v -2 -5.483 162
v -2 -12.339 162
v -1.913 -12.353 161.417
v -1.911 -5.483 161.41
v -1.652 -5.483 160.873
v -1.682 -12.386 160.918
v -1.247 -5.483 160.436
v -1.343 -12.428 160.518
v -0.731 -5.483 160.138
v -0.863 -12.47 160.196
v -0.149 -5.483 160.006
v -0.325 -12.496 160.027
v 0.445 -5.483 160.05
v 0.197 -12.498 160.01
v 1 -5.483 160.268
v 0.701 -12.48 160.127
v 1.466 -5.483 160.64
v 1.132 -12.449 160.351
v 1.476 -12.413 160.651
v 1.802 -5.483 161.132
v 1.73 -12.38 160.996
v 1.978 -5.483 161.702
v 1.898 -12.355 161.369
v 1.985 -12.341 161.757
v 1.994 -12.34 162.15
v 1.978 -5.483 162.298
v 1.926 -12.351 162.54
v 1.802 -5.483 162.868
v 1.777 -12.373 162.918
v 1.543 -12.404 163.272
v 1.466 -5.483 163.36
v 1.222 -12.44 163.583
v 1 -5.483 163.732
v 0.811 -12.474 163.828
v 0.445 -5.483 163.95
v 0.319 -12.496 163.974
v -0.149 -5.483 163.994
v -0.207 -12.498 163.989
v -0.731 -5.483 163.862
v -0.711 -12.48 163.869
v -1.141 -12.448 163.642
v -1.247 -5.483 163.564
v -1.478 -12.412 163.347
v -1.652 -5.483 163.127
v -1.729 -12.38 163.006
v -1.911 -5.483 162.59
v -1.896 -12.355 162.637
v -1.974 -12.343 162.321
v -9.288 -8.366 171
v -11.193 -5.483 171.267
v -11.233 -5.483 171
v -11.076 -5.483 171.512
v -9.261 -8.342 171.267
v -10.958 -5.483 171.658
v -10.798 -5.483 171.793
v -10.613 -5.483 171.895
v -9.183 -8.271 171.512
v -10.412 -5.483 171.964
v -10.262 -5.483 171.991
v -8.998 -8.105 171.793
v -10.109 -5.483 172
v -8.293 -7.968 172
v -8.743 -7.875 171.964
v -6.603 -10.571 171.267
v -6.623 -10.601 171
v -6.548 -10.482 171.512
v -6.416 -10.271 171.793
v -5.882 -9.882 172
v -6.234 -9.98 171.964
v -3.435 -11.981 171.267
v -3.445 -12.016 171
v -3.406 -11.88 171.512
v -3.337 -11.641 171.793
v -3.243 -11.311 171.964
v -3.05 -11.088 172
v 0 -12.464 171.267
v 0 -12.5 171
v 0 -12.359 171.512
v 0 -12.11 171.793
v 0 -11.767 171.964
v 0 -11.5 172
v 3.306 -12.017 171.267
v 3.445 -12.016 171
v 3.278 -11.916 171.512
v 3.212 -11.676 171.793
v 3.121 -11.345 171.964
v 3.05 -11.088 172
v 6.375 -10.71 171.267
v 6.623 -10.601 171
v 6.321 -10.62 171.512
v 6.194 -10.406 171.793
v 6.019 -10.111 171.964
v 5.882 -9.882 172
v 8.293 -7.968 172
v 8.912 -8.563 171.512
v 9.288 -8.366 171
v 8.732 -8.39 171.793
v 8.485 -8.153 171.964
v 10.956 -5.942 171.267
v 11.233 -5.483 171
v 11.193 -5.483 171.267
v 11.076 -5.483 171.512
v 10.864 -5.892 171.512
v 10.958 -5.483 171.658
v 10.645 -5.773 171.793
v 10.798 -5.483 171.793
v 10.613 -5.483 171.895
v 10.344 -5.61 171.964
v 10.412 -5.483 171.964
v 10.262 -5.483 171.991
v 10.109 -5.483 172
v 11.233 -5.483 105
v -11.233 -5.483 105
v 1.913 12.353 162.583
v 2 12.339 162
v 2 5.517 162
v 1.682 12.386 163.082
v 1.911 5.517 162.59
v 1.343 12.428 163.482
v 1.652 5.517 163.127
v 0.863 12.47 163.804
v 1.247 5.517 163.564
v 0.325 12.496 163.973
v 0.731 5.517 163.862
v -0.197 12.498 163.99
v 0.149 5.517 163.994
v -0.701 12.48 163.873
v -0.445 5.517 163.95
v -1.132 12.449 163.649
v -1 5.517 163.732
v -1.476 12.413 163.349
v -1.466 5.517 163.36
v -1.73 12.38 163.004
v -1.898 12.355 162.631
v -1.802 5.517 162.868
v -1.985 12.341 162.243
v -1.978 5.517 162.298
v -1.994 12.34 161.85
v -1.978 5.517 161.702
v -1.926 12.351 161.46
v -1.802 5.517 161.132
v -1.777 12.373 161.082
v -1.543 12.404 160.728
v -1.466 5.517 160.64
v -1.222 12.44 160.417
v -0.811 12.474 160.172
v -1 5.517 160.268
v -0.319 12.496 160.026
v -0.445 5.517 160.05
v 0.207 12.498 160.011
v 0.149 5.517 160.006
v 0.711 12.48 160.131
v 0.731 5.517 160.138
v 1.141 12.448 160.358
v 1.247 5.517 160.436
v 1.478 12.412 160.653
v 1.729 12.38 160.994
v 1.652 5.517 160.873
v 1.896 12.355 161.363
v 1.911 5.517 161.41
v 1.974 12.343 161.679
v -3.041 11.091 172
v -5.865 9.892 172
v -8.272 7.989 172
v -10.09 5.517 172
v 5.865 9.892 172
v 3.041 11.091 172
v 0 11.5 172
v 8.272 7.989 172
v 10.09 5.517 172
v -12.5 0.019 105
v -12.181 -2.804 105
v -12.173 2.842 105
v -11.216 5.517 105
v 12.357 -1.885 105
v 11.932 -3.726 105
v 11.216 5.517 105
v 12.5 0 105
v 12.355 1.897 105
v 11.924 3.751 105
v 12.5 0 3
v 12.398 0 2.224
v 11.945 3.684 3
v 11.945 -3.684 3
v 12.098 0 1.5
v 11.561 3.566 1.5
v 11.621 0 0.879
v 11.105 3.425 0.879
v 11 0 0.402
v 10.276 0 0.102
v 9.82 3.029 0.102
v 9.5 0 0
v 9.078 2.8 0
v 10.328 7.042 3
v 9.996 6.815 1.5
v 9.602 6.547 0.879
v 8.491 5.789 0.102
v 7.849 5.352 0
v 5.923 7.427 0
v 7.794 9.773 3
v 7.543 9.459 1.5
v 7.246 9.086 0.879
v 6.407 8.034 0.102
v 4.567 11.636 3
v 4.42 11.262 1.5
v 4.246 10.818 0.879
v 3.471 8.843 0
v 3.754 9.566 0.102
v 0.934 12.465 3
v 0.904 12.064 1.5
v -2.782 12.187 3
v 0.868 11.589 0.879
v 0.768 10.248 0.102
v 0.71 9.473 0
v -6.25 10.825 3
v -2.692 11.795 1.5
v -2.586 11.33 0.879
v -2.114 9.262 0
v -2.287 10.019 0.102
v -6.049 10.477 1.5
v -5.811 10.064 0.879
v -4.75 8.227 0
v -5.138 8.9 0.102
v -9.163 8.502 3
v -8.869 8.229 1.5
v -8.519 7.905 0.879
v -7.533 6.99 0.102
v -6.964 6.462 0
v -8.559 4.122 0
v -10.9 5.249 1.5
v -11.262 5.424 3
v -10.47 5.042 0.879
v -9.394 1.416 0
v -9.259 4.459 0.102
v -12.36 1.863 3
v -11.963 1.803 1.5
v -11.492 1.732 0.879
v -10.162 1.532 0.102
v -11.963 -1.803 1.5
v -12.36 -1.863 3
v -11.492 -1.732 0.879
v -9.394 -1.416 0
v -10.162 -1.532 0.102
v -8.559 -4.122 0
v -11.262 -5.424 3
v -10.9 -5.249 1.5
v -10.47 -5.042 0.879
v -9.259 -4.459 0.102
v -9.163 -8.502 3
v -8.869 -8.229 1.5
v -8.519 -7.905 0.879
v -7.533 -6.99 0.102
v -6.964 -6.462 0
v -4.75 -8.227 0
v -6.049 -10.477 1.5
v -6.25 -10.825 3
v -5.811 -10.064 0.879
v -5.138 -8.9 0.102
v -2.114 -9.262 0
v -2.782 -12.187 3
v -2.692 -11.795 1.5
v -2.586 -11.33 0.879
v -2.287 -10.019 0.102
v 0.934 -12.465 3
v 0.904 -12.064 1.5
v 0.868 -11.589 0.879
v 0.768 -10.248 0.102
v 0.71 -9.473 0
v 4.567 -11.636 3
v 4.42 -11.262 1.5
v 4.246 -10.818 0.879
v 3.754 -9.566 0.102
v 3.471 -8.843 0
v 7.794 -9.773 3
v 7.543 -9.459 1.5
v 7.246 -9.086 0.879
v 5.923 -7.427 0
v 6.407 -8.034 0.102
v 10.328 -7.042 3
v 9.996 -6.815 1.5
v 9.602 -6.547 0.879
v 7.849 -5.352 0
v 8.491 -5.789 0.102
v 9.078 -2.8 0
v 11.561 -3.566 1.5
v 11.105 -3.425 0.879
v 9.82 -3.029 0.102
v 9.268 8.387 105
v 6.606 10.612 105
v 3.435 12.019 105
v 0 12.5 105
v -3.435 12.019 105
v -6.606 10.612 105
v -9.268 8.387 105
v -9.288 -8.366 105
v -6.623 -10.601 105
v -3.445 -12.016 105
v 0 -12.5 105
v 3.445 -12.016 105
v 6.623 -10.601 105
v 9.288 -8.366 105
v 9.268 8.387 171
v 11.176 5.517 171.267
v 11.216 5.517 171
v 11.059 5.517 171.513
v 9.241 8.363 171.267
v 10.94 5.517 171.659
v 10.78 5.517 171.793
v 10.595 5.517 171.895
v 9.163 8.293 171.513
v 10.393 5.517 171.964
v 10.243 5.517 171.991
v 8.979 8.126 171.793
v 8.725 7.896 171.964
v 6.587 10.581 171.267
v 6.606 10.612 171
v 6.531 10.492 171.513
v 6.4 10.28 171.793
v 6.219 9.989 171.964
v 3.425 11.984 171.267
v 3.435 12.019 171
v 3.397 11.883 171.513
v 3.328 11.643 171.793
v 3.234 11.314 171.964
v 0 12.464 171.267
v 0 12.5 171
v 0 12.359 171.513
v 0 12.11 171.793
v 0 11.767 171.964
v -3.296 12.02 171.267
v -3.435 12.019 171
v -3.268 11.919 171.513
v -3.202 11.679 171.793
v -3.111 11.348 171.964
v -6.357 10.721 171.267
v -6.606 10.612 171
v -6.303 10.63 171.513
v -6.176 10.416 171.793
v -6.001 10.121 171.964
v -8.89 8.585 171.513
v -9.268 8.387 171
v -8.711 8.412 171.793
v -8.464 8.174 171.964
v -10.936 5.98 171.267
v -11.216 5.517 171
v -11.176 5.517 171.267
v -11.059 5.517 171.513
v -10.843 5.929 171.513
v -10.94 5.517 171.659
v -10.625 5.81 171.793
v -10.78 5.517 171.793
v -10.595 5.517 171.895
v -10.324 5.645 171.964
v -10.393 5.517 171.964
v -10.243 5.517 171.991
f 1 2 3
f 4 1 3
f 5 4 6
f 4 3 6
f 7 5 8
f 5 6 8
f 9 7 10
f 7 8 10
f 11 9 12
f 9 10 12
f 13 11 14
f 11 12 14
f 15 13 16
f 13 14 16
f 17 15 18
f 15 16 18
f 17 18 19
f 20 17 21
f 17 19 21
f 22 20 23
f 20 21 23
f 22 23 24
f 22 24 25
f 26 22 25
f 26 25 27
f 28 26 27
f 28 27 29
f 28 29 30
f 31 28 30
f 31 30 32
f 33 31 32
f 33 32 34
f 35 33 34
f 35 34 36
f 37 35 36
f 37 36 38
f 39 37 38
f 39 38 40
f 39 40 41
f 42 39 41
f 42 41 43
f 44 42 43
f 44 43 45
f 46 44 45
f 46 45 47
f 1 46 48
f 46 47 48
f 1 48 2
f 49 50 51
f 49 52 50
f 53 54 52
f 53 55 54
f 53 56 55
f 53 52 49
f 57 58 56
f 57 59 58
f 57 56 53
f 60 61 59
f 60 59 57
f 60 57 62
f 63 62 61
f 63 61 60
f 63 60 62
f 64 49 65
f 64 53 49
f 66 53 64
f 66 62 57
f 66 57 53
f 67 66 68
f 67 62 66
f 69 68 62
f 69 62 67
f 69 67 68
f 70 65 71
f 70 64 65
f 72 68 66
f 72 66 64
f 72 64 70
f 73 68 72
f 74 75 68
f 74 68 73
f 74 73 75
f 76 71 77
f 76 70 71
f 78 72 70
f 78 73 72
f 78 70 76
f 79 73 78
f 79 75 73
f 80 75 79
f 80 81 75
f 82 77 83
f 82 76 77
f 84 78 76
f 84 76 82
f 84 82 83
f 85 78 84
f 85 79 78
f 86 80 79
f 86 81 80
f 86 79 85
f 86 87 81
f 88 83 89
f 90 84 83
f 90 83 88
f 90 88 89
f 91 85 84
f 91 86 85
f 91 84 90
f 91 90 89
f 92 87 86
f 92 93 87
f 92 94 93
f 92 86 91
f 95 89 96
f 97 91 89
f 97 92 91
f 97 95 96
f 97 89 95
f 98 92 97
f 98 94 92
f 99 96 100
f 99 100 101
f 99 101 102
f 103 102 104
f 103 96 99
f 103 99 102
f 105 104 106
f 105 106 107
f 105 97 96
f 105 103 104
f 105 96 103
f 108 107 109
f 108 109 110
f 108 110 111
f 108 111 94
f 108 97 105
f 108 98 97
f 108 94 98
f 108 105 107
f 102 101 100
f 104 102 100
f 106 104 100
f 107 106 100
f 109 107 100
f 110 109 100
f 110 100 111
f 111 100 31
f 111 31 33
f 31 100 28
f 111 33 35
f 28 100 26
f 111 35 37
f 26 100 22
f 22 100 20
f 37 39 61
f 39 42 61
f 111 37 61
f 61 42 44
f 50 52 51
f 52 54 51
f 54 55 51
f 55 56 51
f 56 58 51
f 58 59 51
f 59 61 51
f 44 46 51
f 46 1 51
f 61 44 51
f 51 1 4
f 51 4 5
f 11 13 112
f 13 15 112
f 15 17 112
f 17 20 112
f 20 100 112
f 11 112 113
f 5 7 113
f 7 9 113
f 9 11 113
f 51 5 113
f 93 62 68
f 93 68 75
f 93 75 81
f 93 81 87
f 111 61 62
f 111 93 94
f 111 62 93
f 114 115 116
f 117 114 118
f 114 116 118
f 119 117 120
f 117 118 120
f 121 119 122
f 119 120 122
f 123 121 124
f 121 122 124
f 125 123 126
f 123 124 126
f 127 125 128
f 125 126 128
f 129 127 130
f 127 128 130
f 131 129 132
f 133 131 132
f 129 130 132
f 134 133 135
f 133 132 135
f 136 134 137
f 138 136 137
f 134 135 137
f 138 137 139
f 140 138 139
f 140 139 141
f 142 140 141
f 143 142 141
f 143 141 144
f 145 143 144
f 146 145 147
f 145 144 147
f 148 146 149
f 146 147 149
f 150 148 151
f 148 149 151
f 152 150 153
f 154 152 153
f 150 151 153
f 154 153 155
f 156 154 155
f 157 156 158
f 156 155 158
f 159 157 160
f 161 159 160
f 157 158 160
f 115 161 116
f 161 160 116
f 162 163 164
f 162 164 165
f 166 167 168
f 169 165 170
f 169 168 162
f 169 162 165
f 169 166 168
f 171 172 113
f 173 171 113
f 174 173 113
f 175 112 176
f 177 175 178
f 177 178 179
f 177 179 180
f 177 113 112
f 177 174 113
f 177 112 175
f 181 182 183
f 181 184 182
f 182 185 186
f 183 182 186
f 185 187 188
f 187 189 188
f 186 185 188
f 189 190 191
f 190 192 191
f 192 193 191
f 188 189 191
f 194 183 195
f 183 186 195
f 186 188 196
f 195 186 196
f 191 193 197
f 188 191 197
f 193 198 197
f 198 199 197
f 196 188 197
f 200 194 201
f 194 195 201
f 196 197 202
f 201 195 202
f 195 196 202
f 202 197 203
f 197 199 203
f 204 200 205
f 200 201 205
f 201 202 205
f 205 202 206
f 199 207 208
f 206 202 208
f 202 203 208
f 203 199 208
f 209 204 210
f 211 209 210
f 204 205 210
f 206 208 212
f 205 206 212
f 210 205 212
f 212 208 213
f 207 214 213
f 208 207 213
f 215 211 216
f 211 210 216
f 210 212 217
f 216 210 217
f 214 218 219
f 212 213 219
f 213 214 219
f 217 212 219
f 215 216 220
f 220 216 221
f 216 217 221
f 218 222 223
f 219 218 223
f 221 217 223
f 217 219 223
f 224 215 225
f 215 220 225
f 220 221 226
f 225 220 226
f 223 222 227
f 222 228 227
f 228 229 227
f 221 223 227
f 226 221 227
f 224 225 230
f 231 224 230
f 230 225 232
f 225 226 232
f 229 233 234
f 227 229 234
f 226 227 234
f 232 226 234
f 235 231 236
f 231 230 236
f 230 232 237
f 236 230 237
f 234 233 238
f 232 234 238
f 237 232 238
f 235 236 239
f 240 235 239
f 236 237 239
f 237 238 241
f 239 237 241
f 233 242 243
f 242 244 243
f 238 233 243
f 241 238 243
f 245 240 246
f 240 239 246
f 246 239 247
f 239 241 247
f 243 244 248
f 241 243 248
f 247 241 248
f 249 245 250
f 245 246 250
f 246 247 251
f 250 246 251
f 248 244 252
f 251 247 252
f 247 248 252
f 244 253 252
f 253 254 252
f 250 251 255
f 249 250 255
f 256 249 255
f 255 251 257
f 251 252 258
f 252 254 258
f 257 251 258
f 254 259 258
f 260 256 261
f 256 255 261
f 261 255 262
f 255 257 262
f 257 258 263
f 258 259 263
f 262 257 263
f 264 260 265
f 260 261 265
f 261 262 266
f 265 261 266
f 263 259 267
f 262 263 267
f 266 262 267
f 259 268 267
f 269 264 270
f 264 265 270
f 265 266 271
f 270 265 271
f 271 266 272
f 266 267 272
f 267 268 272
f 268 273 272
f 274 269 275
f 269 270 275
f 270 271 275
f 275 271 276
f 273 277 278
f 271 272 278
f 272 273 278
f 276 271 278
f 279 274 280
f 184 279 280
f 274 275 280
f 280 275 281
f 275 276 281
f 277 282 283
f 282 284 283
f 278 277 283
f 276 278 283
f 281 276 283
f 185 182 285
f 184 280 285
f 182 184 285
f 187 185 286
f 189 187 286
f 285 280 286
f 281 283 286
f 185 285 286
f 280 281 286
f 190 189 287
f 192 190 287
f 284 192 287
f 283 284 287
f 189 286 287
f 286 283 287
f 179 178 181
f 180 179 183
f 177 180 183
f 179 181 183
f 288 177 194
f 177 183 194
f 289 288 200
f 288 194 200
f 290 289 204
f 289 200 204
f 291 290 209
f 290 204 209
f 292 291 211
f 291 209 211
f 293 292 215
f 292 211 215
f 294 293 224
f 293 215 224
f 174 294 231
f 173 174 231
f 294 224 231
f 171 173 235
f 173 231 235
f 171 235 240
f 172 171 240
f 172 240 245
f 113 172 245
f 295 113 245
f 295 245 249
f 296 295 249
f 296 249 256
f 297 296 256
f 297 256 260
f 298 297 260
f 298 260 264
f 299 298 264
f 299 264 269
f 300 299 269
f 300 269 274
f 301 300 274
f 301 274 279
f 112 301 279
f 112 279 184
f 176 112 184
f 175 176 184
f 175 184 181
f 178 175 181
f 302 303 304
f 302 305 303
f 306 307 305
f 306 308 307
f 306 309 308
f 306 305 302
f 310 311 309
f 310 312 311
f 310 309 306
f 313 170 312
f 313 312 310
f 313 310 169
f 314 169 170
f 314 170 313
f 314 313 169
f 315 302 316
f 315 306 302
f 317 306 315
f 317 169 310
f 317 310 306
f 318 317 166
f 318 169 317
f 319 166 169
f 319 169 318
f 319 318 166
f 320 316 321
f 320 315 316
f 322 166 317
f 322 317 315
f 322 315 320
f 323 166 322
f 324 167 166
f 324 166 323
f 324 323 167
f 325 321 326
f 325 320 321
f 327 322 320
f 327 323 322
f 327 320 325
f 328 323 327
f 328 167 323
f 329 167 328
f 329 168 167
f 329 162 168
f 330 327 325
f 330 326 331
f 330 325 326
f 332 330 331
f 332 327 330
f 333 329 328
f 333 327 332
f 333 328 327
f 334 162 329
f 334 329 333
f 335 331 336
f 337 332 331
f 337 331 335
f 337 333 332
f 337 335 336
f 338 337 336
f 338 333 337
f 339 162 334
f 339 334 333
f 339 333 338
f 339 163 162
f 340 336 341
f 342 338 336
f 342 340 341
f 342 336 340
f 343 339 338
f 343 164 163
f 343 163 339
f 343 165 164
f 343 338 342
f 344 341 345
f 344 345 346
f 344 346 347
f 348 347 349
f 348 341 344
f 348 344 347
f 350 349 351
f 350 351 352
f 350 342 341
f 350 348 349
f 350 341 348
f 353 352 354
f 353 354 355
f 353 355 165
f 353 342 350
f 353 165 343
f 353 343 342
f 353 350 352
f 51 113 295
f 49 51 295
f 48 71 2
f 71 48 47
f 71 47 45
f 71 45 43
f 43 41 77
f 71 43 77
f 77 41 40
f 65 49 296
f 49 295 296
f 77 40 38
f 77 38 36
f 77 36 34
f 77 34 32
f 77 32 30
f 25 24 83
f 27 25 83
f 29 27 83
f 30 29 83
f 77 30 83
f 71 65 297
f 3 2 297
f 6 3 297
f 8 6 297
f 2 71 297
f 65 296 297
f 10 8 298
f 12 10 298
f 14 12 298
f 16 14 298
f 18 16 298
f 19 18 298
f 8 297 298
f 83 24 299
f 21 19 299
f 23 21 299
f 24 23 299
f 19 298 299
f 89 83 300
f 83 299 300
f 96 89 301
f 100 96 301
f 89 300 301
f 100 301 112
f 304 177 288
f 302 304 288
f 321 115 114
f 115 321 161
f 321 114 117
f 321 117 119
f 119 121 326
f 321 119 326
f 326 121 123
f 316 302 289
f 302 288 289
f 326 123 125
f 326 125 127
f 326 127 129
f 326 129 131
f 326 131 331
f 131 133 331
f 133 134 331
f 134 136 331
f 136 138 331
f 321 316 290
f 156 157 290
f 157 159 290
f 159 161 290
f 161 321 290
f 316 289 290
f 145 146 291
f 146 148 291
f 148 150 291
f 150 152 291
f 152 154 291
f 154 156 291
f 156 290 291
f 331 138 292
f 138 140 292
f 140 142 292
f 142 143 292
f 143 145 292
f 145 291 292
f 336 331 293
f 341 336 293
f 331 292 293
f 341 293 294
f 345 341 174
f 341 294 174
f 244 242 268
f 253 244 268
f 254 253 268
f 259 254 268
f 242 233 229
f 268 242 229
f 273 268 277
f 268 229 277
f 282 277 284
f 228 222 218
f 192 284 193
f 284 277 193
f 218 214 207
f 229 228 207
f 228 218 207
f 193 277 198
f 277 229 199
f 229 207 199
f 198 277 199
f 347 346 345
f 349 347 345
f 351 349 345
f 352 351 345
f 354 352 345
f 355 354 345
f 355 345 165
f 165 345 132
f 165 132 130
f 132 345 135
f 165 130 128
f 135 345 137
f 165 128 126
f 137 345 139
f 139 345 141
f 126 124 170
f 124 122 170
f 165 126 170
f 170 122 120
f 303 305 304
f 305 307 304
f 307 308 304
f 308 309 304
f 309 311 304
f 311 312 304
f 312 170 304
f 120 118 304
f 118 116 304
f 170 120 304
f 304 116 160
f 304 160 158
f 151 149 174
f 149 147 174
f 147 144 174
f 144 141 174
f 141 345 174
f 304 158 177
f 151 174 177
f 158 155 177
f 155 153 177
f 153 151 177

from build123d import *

# Parameters (mm, degrees)
F0_R     = 12.5
F1_DEPTH = 105
F3_DEPTH = 67
F4_R     = 3
F6_D     = 4
F6_DEPTH = 20
F6_TIP   = 1.2017212381
F7_D     = 4
F7_DEPTH = 20
F7_START = 11
F7_TIP   = 1.2017212381
F8_R     = 1


with BuildPart() as f1:
    # F0 (on Top) → F1 (new body)
    with BuildSketch(Plane.XY):
        Circle(F0_R)
    extrude(amount=F1_DEPTH)

    # F2 (on face) → F3 (join)
    with BuildSketch(Plane.XY.offset(105)):
        with BuildLine():
            Line((11.2334422785, -5.4826795069), (-11.2334422785, -5.4826795069))
            ThreePointArc((-11.2334422785, -5.4826795069), (0, -12.5), (11.2334422785, -5.4826795069))
        make_face()
        with BuildLine():
            ThreePointArc((11.2164688996, 5.5173204931), (0, 12.5), (-11.2164688996, 5.5173204931))
            Line((-11.2164688996, 5.5173204931), (11.2164688996, 5.5173204931))
        make_face()
    extrude(amount=F3_DEPTH)

    # F4
    f4_edges = [f1.edges().sort_by_distance(p)[0] for p in [
        (-12.5, 0, 0),
    ]]
    fillet(f4_edges, radius=F4_R)

    # F6 (one way)
    with BuildSketch(Plane.XZ.offset(-5.5173204931)):
        with Locations((0, 162)):
            Circle(F6_D / 2)
    extrude(amount=-F6_DEPTH, mode=Mode.SUBTRACT)
    with Locations(Plane.XZ.offset(-5.5173204931)):
        with Locations((0, 162)):
            with Locations((0, 0, -(F6_DEPTH + F6_TIP / 2))):  # 118° drill point
                Cone(0, F6_D / 2, F6_TIP, mode=Mode.SUBTRACT)

    # F7
    # its depths count from where the whole tool has entered the part; down to there all is cleared
    with Locations(Plane(origin=(0, 5.5173204931, 0), x_dir=(1, 0, 0), z_dir=(0, 1, 0)).offset(-F7_START)):
        with Locations((0, -162)):
            Hole(F7_D / 2, depth=F7_DEPTH)
            with Locations((0, 0, -(F7_DEPTH + F7_TIP / 2))):  # 118° drill point
                Cone(0, F7_D / 2, F7_TIP, mode=Mode.SUBTRACT)

    # F8
    f8_edges = [f1.edges().sort_by_distance(p)[0] for p in [
        (0, 12.5, 172),
        (0, -12.5, 172),
    ]]
    fillet(f8_edges, radius=F8_R)


solid = f1.part
